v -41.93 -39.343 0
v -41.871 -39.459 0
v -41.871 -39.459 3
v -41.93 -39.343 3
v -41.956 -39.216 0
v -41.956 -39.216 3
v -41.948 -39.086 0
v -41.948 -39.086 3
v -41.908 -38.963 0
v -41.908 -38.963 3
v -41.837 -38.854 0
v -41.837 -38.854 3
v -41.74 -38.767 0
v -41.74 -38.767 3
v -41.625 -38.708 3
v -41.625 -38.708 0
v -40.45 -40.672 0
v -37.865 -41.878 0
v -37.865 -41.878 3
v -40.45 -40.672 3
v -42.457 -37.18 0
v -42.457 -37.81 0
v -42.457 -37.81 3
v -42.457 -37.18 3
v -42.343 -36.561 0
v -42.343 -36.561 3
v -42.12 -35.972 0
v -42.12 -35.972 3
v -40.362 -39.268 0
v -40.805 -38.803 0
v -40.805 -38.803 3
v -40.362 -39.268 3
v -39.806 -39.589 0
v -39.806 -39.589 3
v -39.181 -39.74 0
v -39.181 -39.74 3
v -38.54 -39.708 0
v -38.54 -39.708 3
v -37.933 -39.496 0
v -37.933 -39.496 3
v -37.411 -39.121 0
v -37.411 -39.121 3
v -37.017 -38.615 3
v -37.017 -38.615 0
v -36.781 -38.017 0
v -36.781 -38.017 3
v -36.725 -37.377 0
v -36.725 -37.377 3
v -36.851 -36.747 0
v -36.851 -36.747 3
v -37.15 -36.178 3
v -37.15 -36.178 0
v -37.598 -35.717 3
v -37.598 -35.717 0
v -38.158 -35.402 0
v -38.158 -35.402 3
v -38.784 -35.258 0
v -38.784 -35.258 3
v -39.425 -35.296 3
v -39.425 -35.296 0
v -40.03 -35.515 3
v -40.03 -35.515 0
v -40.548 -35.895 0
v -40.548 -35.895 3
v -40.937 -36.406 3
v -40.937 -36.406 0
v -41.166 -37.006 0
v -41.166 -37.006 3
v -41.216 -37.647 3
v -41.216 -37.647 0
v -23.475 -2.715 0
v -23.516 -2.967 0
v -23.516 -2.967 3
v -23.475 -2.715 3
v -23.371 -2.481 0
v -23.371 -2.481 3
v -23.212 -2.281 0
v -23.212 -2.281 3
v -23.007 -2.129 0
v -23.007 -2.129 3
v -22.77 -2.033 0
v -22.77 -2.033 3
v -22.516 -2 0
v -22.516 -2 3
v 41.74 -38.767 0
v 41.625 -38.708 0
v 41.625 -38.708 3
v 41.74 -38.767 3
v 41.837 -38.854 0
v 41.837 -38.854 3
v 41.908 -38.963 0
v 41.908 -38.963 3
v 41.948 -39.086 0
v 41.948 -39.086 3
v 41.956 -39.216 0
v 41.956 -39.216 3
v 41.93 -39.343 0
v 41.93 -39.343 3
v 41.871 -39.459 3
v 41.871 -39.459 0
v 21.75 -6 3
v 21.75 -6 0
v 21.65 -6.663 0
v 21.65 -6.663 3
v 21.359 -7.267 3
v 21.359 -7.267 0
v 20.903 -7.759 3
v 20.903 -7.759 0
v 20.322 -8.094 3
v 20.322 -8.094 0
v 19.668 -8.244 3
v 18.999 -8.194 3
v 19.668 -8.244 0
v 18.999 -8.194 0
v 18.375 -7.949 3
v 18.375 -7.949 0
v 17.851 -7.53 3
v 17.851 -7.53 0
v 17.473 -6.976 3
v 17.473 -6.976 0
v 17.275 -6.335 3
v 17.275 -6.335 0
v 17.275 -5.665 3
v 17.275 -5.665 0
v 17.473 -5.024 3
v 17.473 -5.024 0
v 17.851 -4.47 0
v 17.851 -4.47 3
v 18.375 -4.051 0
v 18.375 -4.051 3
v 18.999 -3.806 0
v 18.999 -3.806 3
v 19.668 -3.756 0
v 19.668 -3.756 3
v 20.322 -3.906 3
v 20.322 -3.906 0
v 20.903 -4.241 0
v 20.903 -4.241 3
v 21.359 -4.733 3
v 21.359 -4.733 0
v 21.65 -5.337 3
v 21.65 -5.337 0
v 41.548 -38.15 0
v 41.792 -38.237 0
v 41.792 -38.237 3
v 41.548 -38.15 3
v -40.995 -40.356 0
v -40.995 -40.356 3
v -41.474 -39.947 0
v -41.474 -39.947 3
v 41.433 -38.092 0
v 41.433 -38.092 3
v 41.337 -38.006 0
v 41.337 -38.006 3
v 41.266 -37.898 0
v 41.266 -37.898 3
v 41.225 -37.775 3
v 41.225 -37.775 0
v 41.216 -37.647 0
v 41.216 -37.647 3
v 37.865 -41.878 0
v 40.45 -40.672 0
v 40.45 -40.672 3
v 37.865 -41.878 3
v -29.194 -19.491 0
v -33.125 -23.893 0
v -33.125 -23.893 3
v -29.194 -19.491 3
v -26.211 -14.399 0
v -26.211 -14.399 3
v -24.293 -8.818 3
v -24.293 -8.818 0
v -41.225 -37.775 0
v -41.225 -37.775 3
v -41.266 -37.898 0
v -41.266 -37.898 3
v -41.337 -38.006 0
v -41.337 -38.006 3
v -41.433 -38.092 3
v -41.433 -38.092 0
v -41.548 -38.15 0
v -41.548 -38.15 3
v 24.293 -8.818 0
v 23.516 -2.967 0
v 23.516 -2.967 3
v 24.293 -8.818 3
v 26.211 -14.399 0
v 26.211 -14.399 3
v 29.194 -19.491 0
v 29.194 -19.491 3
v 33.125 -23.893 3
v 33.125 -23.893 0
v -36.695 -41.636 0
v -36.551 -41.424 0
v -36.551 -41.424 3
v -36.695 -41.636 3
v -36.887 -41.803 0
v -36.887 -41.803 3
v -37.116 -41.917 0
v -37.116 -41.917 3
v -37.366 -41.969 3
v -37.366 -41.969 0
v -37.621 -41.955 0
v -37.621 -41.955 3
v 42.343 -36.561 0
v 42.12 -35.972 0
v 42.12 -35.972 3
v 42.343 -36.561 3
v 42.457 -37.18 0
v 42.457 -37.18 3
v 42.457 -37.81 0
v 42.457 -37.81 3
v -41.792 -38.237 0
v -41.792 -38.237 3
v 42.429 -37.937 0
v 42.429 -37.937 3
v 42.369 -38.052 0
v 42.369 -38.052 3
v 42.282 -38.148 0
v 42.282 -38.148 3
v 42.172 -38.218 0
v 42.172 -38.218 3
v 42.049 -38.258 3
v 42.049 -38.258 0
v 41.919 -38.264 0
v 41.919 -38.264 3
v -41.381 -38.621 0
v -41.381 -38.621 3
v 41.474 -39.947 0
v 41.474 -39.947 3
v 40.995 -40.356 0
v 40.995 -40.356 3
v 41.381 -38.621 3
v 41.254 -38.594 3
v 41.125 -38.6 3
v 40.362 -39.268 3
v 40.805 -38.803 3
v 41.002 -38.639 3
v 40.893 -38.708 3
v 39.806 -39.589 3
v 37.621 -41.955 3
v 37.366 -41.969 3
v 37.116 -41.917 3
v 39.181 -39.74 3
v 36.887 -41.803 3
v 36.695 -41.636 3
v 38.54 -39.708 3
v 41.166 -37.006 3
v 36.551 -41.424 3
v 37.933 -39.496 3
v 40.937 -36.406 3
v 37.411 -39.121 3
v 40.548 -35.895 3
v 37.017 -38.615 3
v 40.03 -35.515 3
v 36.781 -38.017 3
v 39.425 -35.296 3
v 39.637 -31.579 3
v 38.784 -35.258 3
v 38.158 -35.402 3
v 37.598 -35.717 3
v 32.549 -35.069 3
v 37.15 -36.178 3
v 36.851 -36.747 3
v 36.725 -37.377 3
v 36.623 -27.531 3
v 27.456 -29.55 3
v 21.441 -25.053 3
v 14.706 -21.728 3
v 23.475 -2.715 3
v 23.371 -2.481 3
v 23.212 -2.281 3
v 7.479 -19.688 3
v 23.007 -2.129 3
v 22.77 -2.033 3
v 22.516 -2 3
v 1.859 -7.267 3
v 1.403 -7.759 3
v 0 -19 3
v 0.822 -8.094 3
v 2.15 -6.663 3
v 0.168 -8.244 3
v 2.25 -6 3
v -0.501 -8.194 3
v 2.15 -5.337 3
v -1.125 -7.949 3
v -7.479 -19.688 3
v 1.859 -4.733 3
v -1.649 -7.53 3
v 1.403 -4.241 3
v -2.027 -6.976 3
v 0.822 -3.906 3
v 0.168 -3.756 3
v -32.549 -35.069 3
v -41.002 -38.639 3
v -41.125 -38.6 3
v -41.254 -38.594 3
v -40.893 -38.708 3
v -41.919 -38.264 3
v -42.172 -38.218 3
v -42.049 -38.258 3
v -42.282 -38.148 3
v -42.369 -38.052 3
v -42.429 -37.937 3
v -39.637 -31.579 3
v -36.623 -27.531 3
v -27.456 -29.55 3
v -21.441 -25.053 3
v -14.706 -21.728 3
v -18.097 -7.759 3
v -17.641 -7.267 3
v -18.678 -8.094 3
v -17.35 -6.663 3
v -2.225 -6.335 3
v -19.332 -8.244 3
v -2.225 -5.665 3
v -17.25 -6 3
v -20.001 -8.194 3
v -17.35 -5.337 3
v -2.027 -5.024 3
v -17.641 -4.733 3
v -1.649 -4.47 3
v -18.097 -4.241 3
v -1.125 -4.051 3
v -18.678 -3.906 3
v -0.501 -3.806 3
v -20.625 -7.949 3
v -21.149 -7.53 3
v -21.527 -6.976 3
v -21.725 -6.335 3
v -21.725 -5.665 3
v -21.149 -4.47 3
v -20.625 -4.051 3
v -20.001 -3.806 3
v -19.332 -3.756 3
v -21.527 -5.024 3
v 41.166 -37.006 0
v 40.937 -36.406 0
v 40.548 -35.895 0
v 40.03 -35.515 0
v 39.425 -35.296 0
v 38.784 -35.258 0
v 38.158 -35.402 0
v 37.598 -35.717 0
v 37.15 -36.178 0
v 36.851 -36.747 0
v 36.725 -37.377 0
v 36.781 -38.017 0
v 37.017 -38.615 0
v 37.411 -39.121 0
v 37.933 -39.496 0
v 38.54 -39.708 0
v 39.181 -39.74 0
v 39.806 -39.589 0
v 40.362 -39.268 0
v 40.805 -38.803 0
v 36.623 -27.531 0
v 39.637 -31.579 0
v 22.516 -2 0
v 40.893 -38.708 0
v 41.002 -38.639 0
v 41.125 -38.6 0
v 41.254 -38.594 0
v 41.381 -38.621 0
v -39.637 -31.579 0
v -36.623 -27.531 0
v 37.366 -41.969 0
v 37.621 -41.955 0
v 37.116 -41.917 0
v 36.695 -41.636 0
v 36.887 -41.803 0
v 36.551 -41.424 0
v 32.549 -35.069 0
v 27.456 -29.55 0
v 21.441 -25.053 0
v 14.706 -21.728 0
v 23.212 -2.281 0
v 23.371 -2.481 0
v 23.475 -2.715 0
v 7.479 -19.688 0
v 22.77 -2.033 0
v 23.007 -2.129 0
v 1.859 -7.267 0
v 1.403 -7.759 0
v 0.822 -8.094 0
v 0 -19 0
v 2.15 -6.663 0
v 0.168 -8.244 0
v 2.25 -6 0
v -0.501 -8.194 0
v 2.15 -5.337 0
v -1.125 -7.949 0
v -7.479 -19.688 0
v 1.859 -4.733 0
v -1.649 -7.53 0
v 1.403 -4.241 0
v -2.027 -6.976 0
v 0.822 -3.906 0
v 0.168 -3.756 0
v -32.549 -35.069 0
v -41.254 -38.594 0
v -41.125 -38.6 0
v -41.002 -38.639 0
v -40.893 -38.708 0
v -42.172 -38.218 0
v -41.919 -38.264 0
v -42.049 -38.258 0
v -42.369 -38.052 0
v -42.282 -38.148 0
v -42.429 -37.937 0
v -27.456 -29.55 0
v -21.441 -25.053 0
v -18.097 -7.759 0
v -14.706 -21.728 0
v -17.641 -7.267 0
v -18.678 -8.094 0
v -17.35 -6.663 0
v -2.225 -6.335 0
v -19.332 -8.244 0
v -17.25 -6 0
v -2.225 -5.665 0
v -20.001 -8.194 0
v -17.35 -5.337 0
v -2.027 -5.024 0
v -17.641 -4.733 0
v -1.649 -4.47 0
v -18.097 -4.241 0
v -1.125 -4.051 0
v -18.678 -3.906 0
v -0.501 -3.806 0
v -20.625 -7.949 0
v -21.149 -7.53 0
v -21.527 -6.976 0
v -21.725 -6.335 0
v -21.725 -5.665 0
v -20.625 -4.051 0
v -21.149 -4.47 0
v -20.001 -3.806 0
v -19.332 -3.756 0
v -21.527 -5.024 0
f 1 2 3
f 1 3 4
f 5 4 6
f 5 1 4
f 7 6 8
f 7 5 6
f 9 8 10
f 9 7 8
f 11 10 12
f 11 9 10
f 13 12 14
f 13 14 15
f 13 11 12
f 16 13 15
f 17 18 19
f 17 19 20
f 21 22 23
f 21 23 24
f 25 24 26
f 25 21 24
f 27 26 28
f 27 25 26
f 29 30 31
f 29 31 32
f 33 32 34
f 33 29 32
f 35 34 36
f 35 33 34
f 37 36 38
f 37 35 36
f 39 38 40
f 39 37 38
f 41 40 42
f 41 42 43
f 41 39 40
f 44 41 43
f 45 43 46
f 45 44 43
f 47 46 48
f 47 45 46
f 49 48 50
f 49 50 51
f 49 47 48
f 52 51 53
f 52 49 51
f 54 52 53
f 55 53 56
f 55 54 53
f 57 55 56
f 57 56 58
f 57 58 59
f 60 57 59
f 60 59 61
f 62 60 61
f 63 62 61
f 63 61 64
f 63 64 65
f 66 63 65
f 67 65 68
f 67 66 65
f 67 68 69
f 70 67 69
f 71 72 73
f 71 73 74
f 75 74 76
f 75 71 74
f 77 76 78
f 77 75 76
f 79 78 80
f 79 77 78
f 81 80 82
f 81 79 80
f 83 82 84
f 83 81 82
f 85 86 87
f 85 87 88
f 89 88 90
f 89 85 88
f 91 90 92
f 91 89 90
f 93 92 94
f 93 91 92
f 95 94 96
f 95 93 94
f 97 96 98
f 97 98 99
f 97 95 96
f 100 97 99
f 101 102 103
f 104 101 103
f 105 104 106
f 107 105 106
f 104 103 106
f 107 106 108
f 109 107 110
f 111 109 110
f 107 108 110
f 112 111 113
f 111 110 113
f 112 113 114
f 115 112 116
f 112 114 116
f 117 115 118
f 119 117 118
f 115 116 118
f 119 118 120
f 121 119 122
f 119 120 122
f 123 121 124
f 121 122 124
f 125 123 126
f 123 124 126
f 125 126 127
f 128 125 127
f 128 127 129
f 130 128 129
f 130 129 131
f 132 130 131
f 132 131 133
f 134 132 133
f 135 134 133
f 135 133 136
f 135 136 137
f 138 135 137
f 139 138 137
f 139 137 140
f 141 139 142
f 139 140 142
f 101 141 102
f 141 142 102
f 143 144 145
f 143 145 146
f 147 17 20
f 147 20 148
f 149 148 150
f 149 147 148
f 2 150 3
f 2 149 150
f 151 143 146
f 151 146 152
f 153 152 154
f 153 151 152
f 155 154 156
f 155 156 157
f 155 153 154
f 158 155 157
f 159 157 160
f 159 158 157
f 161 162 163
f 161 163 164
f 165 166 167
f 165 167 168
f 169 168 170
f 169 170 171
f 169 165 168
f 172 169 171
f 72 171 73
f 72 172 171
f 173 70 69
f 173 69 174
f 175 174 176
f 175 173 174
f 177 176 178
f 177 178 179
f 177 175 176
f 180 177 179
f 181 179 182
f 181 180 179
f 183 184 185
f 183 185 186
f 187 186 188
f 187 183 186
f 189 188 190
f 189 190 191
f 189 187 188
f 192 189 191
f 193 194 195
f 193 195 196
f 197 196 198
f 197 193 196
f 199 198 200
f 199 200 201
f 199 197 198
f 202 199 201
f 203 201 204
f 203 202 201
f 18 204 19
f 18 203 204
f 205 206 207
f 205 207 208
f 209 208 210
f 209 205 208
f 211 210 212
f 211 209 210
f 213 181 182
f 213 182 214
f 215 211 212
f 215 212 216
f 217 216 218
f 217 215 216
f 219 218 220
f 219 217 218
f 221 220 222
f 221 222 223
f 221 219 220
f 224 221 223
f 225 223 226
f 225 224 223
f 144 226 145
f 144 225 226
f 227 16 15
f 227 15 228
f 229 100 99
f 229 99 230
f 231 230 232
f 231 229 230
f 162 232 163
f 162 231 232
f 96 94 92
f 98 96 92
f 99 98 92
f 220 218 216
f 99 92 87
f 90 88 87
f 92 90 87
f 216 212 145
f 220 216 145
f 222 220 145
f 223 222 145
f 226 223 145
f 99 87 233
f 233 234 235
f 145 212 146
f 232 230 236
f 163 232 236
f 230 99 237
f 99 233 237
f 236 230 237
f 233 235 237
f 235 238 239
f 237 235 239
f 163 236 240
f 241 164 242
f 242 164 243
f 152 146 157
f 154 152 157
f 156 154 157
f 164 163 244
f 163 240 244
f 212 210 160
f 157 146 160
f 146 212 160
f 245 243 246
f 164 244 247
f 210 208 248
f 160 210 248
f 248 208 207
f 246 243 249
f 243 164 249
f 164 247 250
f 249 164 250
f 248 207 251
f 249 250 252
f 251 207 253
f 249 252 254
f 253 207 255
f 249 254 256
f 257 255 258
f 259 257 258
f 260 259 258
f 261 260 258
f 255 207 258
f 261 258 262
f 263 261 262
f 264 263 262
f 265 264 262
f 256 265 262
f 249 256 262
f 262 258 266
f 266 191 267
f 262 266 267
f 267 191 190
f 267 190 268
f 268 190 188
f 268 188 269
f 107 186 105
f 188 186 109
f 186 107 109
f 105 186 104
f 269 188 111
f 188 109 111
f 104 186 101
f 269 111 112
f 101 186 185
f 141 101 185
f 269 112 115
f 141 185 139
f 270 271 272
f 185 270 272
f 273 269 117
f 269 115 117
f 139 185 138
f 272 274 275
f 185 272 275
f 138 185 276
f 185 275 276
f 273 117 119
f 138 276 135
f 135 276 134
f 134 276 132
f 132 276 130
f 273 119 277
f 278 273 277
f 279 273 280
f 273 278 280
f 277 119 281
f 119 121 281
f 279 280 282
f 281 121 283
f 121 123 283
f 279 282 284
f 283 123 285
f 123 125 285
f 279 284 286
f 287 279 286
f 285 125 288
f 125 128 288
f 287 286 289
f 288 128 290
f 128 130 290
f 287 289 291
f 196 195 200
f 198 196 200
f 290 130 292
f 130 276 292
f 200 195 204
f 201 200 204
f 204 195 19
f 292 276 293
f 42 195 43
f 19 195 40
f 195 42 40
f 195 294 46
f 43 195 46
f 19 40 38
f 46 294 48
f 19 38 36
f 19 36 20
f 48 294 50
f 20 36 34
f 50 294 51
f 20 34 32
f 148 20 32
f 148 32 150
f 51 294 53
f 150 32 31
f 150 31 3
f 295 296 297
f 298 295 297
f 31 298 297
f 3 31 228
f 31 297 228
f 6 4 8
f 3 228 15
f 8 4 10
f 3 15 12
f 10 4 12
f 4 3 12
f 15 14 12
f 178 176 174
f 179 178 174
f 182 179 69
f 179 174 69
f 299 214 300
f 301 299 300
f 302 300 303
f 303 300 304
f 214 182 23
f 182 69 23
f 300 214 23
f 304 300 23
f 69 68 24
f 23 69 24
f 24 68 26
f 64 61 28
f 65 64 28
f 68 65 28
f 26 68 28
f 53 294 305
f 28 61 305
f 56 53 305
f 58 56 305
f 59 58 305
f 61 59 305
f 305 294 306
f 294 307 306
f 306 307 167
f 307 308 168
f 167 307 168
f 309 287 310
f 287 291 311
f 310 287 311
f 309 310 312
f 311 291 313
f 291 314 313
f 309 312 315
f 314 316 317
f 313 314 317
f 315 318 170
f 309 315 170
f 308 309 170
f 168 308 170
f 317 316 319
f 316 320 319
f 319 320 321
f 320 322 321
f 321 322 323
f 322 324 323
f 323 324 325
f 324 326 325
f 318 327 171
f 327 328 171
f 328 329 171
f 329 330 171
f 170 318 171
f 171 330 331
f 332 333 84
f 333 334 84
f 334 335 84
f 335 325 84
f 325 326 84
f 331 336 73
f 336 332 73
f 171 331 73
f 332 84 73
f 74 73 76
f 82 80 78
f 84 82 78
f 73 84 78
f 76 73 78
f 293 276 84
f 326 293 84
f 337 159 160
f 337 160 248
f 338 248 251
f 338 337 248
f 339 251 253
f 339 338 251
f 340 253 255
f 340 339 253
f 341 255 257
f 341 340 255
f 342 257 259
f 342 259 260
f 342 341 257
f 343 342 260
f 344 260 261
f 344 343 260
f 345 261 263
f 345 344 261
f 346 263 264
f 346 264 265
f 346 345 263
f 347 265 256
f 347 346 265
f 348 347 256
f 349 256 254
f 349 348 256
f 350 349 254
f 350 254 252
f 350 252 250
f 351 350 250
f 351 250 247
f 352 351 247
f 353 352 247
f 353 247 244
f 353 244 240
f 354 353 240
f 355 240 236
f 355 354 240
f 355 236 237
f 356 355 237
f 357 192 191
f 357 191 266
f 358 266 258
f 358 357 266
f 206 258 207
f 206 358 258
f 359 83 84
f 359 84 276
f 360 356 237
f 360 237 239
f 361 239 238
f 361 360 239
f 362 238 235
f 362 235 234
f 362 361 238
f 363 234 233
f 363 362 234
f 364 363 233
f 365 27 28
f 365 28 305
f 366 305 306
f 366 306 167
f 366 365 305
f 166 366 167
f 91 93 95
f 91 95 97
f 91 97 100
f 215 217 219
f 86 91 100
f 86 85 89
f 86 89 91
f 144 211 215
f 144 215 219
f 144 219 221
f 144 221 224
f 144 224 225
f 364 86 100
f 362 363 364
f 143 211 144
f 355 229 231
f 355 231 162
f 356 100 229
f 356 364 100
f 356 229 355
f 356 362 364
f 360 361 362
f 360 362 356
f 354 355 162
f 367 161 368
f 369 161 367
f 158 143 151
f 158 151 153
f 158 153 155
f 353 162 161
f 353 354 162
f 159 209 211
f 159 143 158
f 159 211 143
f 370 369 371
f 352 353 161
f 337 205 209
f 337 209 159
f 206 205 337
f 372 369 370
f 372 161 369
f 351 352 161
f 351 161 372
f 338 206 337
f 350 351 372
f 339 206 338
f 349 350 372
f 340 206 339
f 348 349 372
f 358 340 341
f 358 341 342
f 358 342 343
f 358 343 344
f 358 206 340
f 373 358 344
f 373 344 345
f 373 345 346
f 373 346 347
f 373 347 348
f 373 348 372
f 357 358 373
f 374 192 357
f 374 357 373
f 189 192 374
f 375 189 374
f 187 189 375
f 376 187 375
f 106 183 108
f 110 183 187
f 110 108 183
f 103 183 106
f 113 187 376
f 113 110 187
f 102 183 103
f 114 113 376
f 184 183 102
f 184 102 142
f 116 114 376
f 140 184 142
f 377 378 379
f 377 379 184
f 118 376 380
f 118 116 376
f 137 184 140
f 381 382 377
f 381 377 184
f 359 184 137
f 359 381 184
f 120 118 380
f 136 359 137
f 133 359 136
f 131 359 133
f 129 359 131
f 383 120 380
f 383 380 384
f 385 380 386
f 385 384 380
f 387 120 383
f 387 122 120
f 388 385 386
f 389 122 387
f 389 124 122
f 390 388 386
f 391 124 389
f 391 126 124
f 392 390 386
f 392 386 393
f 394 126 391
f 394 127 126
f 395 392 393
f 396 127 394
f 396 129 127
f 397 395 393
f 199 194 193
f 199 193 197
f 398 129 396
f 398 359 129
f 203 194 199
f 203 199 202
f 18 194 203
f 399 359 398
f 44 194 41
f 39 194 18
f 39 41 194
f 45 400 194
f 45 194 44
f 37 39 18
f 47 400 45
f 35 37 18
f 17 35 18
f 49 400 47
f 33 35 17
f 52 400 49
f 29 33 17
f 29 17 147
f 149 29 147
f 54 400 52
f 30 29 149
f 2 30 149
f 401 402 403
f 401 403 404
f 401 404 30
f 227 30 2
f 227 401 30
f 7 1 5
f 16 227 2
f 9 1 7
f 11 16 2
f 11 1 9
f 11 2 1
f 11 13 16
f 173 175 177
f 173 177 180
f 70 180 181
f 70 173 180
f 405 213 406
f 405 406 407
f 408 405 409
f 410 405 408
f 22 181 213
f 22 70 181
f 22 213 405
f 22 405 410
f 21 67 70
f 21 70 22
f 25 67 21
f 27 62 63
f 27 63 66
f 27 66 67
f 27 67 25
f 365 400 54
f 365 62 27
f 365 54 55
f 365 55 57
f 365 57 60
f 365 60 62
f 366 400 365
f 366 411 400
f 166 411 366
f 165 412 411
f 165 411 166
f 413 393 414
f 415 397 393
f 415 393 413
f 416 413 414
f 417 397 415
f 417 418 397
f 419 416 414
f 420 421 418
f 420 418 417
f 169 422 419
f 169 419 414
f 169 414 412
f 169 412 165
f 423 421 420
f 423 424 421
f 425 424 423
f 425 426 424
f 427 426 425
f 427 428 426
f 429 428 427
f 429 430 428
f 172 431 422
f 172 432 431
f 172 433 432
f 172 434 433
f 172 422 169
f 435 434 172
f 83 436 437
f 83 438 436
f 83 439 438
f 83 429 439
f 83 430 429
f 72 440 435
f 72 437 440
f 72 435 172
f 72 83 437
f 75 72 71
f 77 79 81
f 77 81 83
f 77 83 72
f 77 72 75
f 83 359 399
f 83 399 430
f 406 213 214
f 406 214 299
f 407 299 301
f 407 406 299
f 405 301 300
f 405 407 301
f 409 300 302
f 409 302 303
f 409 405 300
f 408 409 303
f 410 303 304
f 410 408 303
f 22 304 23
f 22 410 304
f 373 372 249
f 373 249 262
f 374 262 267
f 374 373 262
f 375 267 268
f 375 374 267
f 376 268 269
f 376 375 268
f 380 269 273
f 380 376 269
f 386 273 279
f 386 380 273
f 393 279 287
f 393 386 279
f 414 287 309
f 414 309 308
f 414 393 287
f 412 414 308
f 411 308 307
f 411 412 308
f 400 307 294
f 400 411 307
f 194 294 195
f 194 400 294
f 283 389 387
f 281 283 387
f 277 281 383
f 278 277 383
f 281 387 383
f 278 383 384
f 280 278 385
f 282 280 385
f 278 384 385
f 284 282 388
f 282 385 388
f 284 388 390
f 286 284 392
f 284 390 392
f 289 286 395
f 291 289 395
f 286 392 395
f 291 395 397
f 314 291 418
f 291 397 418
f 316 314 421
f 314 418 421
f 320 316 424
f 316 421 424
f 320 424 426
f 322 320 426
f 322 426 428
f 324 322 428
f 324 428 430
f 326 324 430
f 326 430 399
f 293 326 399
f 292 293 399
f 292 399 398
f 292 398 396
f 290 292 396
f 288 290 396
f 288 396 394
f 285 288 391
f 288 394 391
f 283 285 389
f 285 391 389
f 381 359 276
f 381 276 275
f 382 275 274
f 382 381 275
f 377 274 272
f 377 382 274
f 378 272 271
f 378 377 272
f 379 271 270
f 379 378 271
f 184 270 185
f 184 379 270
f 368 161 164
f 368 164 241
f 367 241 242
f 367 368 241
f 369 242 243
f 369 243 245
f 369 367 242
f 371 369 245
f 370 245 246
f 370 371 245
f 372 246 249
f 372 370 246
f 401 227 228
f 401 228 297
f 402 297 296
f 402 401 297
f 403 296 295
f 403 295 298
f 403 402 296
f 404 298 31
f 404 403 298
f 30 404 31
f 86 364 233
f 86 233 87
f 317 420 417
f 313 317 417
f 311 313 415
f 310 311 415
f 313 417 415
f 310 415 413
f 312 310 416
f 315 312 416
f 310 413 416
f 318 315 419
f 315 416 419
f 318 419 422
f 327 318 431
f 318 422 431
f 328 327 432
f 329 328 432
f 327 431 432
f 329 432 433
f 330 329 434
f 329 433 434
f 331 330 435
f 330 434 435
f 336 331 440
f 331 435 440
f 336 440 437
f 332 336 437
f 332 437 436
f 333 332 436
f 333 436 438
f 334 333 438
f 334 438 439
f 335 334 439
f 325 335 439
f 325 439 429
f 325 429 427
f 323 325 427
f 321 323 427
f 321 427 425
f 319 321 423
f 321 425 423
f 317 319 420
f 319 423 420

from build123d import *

# Parameters (mm, degrees)
SKETCH_1_R      = 2.25
EXTRUDE_1_DEPTH = 3


with BuildPart() as part:
    # 草图1 → 凸台-拉伸1 (new body)
    with BuildSketch(Plane(origin=(0, 0, 0), x_dir=(-1, 0, 0), z_dir=(0, 0, -1))):
        with BuildLine():
            Line((-41.791952639, -38.236908366), (-41.547911956, -38.150201988))
            ThreePointArc((-41.547911956, -38.150201988), (-41.297660294, -37.953957018), (-41.216368699, -37.646500259))
            ThreePointArc((-41.216368699, -37.646500259), (-36.850985646, -36.746719128), (-40.805488223, -38.802949817))
            ThreePointArc((-40.805488223, -38.802949817), (-41.062544272, -38.615706205), (-41.380516207, -38.621348105))
            Line((-41.380516207, -38.621348105), (-41.62455689, -38.708054482))
            ThreePointArc((-41.62455689, -38.708054482), (-41.932143393, -39.023021663), (-41.871497469, -39.459067365))
            ThreePointArc((-41.871497469, -39.459067365), (-41.243343249, -40.162162054), (-40.450307086, -40.672077255))
            Line((-40.450307086, -40.672077255), (-37.864755045, -41.877739972))
            ThreePointArc((-37.864755045, -41.877739972), (-37.116075694, -41.916780886), (-36.550657336, -41.424493323))
            ThreePointArc((-36.550657336, -41.424493323), (0, -19), (36.550657336, -41.424493323))
            ThreePointArc((36.550657336, -41.424493323), (37.116075694, -41.916780886), (37.864755045, -41.877739972))
            Line((37.864755045, -41.877739972), (40.450307086, -40.672077255))
            ThreePointArc((40.450307086, -40.672077255), (41.243343249, -40.162162054), (41.871497469, -39.459067365))
            ThreePointArc((41.871497469, -39.459067365), (41.932143393, -39.023021663), (41.62455689, -38.708054482))
            Line((41.62455689, -38.708054482), (41.380516207, -38.621348105))
            ThreePointArc((41.380516207, -38.621348105), (41.062544272, -38.615706205), (40.805488223, -38.802949817))
            ThreePointArc((40.805488223, -38.802949817), (36.850985646, -36.746719128), (41.216368699, -37.646500259))
            ThreePointArc((41.216368699, -37.646500259), (41.297660294, -37.953957018), (41.547911956, -38.150201988))
            Line((41.547911956, -38.150201988), (41.791952639, -38.236908366))
            ThreePointArc((41.791952639, -38.236908366), (42.229313556, -38.186617104), (42.457382592, -37.810055957))
            ThreePointArc((42.457382592, -37.810055957), (42.413654712, -36.868245075), (42.120121371, -35.972277417))
            ThreePointArc((42.120121371, -35.972277417), (38.193299638, -29.507864773), (33.125428162, -23.893130722))
            ThreePointArc((33.125428162, -23.893130722), (26.210916767, -14.399107105), (23.515754966, -2.967438148))
            ThreePointArc((23.515754966, -2.967438148), (23.211784398, -2.281473086), (22.516285244, -2))
            Line((22.516285244, -2), (-22.516285244, -2))
            ThreePointArc((-22.516285244, -2), (-23.211784398, -2.281473086), (-23.515754966, -2.967438148))
            ThreePointArc((-23.515754966, -2.967438148), (-26.210916767, -14.399107105), (-33.125428162, -23.893130722))
            ThreePointArc((-33.125428162, -23.893130722), (-38.193299638, -29.507864773), (-42.120121371, -35.972277417))
            ThreePointArc((-42.120121371, -35.972277417), (-42.413654712, -36.868245075), (-42.457382592, -37.810055957))
            ThreePointArc((-42.457382592, -37.810055957), (-42.229313556, -38.186617104), (-41.791952639, -38.236908366))
        make_face()
        with Locations(Location((0, -6, 0), (0, 0, 180))):
            Circle(SKETCH_1_R, mode=Mode.SUBTRACT)
        with Locations(Location((19.5, -6, 0), (0, 0, 180))):
            Circle(SKETCH_1_R, mode=Mode.SUBTRACT)
        with Locations(Location((-19.5, -6, 0), (0, 0, 180))):
            Circle(SKETCH_1_R, mode=Mode.SUBTRACT)
    extrude(amount=-EXTRUDE_1_DEPTH)


solid = part.part
